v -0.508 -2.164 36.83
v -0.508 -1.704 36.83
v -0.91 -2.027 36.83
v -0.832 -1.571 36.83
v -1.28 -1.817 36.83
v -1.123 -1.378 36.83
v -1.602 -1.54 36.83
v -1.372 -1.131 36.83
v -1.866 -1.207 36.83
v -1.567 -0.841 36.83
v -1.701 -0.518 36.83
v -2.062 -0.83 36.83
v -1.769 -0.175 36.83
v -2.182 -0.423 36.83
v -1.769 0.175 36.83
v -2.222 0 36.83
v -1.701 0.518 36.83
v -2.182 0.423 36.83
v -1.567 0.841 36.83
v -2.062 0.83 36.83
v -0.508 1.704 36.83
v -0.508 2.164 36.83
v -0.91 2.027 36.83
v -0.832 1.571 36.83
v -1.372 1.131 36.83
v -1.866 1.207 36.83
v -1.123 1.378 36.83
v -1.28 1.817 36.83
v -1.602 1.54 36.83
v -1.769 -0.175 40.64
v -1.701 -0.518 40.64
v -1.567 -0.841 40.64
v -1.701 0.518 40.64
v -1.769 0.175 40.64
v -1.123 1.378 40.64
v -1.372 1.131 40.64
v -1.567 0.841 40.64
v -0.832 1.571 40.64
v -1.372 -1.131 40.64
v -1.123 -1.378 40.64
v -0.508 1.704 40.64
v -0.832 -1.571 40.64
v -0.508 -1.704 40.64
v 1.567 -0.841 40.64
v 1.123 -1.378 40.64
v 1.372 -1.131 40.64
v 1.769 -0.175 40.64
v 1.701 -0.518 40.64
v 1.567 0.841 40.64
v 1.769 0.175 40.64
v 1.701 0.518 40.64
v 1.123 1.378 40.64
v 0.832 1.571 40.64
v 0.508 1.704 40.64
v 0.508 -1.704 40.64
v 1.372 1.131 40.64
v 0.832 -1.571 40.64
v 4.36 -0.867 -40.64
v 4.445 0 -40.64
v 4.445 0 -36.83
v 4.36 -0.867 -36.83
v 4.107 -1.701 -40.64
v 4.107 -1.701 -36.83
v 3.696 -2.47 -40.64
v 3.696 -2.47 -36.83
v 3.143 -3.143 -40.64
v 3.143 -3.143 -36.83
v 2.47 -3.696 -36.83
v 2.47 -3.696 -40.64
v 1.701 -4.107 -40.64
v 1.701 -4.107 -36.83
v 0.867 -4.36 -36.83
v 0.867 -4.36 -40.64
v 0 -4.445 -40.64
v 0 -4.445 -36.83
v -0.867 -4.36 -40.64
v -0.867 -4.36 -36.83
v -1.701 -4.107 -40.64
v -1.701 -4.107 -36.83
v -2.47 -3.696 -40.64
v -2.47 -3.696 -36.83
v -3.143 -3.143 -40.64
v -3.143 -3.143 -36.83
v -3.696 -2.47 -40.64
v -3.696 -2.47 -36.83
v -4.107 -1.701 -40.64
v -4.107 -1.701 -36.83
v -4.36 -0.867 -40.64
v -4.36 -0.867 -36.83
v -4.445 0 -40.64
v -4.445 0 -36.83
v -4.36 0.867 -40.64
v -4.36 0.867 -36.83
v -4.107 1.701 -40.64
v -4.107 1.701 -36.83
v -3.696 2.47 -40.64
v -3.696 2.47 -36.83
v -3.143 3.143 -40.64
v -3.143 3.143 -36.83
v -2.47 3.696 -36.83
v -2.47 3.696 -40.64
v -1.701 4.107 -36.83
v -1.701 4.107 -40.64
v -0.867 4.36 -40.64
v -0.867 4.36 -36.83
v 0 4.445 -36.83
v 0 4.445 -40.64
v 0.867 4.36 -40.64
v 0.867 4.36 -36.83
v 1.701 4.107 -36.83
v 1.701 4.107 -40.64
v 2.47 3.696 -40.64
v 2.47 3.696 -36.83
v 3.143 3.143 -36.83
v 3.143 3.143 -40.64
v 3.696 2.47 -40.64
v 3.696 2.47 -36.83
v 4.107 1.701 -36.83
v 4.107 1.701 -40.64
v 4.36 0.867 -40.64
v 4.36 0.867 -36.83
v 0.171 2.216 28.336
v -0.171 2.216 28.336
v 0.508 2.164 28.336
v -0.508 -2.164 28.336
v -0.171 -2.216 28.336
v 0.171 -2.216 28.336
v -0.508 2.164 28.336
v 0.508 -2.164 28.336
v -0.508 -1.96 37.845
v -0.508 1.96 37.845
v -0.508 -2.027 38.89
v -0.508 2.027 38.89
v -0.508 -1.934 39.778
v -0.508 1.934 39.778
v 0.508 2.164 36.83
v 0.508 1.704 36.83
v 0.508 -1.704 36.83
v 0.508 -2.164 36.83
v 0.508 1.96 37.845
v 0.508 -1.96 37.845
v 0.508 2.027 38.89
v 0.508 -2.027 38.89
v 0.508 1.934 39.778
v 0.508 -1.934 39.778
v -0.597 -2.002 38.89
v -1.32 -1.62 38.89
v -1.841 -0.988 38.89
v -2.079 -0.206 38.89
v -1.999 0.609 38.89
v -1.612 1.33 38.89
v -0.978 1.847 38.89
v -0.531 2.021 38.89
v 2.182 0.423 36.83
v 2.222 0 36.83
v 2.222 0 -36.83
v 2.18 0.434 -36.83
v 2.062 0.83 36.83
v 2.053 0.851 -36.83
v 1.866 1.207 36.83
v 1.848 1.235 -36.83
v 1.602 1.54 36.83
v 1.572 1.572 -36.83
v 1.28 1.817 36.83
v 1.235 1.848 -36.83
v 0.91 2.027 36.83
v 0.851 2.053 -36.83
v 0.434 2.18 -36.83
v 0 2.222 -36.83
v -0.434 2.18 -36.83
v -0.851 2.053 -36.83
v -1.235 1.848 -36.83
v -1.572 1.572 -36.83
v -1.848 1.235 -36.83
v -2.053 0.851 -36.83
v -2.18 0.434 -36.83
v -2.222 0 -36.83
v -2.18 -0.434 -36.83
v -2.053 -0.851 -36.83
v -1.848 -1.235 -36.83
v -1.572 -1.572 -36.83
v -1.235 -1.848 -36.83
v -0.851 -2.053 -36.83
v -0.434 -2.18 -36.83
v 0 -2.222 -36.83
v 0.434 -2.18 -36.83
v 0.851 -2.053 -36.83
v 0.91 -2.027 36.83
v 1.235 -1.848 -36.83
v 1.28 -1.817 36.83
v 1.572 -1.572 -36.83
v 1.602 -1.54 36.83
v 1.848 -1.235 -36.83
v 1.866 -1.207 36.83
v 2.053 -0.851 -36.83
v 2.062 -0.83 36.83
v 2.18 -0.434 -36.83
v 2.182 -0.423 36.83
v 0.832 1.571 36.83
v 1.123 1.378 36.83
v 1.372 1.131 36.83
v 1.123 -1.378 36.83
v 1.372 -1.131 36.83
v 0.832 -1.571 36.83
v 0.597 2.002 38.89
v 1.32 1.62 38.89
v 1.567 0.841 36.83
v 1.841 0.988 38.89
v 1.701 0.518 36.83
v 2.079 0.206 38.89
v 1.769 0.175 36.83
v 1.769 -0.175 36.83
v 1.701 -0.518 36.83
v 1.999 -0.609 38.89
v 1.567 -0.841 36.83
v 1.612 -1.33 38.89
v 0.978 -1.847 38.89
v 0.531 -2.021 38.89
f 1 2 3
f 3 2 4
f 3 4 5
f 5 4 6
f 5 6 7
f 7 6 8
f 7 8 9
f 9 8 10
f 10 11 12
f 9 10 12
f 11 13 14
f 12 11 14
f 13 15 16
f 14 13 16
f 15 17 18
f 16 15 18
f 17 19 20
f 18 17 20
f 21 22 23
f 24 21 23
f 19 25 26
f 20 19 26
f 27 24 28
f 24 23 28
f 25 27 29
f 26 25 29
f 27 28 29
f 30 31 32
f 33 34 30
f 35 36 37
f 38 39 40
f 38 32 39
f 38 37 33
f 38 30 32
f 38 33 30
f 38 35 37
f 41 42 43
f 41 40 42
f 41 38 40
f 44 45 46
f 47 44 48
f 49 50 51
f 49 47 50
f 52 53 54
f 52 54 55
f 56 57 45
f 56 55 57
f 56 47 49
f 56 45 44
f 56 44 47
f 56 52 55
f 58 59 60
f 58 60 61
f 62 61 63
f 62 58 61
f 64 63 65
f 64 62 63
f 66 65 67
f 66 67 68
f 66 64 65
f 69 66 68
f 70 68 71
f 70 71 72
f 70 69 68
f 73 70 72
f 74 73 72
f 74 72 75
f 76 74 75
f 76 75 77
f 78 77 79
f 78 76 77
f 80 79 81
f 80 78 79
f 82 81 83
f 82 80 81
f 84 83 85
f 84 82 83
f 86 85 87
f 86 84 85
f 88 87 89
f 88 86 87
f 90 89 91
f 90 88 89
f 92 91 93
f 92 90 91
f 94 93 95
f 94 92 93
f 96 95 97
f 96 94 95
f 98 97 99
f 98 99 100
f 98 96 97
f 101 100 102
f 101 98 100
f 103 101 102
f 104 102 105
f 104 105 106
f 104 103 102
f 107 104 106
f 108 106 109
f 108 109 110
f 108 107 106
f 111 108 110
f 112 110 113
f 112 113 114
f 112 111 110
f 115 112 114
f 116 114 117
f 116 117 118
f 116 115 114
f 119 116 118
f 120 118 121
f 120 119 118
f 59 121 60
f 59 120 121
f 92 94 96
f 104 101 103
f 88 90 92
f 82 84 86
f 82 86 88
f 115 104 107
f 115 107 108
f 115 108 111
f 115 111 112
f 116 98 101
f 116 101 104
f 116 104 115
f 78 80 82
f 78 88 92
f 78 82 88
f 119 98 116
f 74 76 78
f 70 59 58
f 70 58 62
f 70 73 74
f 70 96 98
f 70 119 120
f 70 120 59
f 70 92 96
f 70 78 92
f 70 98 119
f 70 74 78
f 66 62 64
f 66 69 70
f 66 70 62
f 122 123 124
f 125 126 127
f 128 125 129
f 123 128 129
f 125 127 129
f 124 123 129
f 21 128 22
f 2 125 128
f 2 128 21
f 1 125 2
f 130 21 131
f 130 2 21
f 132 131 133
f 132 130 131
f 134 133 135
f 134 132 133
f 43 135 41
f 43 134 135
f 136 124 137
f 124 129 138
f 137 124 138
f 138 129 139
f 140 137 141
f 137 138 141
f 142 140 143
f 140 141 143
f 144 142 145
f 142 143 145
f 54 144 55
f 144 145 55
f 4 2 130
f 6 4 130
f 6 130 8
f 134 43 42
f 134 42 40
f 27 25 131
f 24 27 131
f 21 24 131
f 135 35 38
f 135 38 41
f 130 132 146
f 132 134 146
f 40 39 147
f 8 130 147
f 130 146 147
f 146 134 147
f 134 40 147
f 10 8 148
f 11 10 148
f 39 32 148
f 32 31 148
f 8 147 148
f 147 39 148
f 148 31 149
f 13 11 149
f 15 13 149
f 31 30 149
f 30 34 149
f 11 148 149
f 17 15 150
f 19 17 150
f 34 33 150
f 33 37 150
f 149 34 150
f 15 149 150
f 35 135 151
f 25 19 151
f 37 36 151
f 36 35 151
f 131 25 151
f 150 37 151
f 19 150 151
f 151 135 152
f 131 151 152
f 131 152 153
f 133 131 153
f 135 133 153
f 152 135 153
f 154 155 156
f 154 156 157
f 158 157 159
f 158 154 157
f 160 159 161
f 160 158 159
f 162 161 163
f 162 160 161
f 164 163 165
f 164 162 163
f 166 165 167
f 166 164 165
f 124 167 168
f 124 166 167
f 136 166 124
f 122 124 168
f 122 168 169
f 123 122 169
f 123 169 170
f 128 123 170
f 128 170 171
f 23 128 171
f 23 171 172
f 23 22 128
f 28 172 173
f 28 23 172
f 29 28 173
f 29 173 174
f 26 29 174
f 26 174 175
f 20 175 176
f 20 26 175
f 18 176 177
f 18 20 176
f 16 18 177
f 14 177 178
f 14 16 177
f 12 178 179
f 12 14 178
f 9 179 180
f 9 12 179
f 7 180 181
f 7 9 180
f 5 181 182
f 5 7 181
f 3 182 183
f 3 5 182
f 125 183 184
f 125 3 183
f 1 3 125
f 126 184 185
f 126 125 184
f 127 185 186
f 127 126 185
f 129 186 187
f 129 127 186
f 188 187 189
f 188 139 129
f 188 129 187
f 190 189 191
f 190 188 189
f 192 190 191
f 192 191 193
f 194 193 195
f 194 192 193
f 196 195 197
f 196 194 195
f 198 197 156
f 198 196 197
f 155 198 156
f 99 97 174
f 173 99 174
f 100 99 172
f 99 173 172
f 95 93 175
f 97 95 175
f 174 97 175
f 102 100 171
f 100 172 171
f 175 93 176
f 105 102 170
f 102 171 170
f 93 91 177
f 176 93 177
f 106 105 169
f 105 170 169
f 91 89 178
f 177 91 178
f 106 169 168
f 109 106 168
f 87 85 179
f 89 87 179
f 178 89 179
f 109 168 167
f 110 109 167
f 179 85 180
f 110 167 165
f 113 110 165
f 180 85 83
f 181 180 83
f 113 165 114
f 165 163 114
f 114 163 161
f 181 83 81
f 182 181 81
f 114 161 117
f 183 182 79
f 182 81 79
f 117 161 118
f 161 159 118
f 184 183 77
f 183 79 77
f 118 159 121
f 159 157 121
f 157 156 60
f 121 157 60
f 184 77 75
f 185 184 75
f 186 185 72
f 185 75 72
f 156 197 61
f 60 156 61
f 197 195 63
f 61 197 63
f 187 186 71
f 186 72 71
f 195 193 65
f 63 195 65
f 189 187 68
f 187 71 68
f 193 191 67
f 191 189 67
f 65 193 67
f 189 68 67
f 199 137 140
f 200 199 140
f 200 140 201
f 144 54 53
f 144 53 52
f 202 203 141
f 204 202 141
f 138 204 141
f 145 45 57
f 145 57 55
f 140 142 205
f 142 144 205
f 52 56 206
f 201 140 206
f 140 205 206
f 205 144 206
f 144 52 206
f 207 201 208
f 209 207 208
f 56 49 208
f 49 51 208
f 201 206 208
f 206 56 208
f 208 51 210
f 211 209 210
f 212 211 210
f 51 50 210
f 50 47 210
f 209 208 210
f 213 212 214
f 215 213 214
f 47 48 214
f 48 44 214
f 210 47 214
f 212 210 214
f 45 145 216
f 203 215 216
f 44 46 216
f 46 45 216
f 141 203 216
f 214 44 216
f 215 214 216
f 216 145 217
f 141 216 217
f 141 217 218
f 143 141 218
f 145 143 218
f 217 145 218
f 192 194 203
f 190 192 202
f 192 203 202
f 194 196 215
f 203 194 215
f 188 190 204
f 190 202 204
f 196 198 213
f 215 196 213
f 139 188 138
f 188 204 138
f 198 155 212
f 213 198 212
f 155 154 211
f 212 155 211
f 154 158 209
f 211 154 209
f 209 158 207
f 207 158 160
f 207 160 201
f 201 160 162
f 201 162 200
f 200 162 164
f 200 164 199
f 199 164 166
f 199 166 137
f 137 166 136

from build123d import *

# Parameters (mm, degrees)
F0_R          = 2.2225
F1_DEPTH      = 40.64
F1_DEPTH_BACK = 40.64
F2_R          = 4.445
F2_R_2        = 2.2225
F3_DEPTH      = 3.81
F6_W          = 1.016
F6_H          = 12.7
F7_DEPTH      = 25.4
F7_DEPTH_BACK = 25.4


with BuildPart() as f1:
    # F0 (on Top) → F1 (new body, two sides)
    with BuildSketch(Plane.XY) as f1_sk:
        Circle(F0_R)
    extrude(amount=F1_DEPTH)
    extrude(f1_sk.sketch, amount=-F1_DEPTH_BACK)

    # F2 (on face) → F3 (join)
    with BuildSketch(Plane(origin=(0, 0, -40.64), x_dir=(1, 0, 0), z_dir=(0, 0, -1))):
        Circle(F2_R)
        Circle(F2_R_2, mode=Mode.SUBTRACT)
    extrude(amount=-F3_DEPTH)

    # F4 (on Front) → F5 (revolve, cut)
    with BuildSketch(Plane.XZ):
        with BuildLine():
            ThreePointArc((-1.778, 36.83), (-2.0915595064, 38.735), (-1.778, 40.64))
            Line((-1.778, 40.64), (-5.5500328927, 40.64))
            Line((-5.5500328927, 40.64), (-5.5500328927, 36.83))
            Line((-5.5500328927, 36.83), (-1.778, 36.83))
        make_face()
    revolve(axis=Axis((0, 0, 38.735), (0, 0, -1)), mode=Mode.SUBTRACT)

    # F6 (on Front) → F7 (cut, two sides)
    with BuildSketch(Plane.XZ) as f7_sk:
        with Locations((0, 34.6862748265)):
            Rectangle(F6_W, F6_H)
    extrude(amount=-F7_DEPTH, mode=Mode.SUBTRACT)
    extrude(f7_sk.sketch, amount=F7_DEPTH_BACK, mode=Mode.SUBTRACT)


solid = f1.part
